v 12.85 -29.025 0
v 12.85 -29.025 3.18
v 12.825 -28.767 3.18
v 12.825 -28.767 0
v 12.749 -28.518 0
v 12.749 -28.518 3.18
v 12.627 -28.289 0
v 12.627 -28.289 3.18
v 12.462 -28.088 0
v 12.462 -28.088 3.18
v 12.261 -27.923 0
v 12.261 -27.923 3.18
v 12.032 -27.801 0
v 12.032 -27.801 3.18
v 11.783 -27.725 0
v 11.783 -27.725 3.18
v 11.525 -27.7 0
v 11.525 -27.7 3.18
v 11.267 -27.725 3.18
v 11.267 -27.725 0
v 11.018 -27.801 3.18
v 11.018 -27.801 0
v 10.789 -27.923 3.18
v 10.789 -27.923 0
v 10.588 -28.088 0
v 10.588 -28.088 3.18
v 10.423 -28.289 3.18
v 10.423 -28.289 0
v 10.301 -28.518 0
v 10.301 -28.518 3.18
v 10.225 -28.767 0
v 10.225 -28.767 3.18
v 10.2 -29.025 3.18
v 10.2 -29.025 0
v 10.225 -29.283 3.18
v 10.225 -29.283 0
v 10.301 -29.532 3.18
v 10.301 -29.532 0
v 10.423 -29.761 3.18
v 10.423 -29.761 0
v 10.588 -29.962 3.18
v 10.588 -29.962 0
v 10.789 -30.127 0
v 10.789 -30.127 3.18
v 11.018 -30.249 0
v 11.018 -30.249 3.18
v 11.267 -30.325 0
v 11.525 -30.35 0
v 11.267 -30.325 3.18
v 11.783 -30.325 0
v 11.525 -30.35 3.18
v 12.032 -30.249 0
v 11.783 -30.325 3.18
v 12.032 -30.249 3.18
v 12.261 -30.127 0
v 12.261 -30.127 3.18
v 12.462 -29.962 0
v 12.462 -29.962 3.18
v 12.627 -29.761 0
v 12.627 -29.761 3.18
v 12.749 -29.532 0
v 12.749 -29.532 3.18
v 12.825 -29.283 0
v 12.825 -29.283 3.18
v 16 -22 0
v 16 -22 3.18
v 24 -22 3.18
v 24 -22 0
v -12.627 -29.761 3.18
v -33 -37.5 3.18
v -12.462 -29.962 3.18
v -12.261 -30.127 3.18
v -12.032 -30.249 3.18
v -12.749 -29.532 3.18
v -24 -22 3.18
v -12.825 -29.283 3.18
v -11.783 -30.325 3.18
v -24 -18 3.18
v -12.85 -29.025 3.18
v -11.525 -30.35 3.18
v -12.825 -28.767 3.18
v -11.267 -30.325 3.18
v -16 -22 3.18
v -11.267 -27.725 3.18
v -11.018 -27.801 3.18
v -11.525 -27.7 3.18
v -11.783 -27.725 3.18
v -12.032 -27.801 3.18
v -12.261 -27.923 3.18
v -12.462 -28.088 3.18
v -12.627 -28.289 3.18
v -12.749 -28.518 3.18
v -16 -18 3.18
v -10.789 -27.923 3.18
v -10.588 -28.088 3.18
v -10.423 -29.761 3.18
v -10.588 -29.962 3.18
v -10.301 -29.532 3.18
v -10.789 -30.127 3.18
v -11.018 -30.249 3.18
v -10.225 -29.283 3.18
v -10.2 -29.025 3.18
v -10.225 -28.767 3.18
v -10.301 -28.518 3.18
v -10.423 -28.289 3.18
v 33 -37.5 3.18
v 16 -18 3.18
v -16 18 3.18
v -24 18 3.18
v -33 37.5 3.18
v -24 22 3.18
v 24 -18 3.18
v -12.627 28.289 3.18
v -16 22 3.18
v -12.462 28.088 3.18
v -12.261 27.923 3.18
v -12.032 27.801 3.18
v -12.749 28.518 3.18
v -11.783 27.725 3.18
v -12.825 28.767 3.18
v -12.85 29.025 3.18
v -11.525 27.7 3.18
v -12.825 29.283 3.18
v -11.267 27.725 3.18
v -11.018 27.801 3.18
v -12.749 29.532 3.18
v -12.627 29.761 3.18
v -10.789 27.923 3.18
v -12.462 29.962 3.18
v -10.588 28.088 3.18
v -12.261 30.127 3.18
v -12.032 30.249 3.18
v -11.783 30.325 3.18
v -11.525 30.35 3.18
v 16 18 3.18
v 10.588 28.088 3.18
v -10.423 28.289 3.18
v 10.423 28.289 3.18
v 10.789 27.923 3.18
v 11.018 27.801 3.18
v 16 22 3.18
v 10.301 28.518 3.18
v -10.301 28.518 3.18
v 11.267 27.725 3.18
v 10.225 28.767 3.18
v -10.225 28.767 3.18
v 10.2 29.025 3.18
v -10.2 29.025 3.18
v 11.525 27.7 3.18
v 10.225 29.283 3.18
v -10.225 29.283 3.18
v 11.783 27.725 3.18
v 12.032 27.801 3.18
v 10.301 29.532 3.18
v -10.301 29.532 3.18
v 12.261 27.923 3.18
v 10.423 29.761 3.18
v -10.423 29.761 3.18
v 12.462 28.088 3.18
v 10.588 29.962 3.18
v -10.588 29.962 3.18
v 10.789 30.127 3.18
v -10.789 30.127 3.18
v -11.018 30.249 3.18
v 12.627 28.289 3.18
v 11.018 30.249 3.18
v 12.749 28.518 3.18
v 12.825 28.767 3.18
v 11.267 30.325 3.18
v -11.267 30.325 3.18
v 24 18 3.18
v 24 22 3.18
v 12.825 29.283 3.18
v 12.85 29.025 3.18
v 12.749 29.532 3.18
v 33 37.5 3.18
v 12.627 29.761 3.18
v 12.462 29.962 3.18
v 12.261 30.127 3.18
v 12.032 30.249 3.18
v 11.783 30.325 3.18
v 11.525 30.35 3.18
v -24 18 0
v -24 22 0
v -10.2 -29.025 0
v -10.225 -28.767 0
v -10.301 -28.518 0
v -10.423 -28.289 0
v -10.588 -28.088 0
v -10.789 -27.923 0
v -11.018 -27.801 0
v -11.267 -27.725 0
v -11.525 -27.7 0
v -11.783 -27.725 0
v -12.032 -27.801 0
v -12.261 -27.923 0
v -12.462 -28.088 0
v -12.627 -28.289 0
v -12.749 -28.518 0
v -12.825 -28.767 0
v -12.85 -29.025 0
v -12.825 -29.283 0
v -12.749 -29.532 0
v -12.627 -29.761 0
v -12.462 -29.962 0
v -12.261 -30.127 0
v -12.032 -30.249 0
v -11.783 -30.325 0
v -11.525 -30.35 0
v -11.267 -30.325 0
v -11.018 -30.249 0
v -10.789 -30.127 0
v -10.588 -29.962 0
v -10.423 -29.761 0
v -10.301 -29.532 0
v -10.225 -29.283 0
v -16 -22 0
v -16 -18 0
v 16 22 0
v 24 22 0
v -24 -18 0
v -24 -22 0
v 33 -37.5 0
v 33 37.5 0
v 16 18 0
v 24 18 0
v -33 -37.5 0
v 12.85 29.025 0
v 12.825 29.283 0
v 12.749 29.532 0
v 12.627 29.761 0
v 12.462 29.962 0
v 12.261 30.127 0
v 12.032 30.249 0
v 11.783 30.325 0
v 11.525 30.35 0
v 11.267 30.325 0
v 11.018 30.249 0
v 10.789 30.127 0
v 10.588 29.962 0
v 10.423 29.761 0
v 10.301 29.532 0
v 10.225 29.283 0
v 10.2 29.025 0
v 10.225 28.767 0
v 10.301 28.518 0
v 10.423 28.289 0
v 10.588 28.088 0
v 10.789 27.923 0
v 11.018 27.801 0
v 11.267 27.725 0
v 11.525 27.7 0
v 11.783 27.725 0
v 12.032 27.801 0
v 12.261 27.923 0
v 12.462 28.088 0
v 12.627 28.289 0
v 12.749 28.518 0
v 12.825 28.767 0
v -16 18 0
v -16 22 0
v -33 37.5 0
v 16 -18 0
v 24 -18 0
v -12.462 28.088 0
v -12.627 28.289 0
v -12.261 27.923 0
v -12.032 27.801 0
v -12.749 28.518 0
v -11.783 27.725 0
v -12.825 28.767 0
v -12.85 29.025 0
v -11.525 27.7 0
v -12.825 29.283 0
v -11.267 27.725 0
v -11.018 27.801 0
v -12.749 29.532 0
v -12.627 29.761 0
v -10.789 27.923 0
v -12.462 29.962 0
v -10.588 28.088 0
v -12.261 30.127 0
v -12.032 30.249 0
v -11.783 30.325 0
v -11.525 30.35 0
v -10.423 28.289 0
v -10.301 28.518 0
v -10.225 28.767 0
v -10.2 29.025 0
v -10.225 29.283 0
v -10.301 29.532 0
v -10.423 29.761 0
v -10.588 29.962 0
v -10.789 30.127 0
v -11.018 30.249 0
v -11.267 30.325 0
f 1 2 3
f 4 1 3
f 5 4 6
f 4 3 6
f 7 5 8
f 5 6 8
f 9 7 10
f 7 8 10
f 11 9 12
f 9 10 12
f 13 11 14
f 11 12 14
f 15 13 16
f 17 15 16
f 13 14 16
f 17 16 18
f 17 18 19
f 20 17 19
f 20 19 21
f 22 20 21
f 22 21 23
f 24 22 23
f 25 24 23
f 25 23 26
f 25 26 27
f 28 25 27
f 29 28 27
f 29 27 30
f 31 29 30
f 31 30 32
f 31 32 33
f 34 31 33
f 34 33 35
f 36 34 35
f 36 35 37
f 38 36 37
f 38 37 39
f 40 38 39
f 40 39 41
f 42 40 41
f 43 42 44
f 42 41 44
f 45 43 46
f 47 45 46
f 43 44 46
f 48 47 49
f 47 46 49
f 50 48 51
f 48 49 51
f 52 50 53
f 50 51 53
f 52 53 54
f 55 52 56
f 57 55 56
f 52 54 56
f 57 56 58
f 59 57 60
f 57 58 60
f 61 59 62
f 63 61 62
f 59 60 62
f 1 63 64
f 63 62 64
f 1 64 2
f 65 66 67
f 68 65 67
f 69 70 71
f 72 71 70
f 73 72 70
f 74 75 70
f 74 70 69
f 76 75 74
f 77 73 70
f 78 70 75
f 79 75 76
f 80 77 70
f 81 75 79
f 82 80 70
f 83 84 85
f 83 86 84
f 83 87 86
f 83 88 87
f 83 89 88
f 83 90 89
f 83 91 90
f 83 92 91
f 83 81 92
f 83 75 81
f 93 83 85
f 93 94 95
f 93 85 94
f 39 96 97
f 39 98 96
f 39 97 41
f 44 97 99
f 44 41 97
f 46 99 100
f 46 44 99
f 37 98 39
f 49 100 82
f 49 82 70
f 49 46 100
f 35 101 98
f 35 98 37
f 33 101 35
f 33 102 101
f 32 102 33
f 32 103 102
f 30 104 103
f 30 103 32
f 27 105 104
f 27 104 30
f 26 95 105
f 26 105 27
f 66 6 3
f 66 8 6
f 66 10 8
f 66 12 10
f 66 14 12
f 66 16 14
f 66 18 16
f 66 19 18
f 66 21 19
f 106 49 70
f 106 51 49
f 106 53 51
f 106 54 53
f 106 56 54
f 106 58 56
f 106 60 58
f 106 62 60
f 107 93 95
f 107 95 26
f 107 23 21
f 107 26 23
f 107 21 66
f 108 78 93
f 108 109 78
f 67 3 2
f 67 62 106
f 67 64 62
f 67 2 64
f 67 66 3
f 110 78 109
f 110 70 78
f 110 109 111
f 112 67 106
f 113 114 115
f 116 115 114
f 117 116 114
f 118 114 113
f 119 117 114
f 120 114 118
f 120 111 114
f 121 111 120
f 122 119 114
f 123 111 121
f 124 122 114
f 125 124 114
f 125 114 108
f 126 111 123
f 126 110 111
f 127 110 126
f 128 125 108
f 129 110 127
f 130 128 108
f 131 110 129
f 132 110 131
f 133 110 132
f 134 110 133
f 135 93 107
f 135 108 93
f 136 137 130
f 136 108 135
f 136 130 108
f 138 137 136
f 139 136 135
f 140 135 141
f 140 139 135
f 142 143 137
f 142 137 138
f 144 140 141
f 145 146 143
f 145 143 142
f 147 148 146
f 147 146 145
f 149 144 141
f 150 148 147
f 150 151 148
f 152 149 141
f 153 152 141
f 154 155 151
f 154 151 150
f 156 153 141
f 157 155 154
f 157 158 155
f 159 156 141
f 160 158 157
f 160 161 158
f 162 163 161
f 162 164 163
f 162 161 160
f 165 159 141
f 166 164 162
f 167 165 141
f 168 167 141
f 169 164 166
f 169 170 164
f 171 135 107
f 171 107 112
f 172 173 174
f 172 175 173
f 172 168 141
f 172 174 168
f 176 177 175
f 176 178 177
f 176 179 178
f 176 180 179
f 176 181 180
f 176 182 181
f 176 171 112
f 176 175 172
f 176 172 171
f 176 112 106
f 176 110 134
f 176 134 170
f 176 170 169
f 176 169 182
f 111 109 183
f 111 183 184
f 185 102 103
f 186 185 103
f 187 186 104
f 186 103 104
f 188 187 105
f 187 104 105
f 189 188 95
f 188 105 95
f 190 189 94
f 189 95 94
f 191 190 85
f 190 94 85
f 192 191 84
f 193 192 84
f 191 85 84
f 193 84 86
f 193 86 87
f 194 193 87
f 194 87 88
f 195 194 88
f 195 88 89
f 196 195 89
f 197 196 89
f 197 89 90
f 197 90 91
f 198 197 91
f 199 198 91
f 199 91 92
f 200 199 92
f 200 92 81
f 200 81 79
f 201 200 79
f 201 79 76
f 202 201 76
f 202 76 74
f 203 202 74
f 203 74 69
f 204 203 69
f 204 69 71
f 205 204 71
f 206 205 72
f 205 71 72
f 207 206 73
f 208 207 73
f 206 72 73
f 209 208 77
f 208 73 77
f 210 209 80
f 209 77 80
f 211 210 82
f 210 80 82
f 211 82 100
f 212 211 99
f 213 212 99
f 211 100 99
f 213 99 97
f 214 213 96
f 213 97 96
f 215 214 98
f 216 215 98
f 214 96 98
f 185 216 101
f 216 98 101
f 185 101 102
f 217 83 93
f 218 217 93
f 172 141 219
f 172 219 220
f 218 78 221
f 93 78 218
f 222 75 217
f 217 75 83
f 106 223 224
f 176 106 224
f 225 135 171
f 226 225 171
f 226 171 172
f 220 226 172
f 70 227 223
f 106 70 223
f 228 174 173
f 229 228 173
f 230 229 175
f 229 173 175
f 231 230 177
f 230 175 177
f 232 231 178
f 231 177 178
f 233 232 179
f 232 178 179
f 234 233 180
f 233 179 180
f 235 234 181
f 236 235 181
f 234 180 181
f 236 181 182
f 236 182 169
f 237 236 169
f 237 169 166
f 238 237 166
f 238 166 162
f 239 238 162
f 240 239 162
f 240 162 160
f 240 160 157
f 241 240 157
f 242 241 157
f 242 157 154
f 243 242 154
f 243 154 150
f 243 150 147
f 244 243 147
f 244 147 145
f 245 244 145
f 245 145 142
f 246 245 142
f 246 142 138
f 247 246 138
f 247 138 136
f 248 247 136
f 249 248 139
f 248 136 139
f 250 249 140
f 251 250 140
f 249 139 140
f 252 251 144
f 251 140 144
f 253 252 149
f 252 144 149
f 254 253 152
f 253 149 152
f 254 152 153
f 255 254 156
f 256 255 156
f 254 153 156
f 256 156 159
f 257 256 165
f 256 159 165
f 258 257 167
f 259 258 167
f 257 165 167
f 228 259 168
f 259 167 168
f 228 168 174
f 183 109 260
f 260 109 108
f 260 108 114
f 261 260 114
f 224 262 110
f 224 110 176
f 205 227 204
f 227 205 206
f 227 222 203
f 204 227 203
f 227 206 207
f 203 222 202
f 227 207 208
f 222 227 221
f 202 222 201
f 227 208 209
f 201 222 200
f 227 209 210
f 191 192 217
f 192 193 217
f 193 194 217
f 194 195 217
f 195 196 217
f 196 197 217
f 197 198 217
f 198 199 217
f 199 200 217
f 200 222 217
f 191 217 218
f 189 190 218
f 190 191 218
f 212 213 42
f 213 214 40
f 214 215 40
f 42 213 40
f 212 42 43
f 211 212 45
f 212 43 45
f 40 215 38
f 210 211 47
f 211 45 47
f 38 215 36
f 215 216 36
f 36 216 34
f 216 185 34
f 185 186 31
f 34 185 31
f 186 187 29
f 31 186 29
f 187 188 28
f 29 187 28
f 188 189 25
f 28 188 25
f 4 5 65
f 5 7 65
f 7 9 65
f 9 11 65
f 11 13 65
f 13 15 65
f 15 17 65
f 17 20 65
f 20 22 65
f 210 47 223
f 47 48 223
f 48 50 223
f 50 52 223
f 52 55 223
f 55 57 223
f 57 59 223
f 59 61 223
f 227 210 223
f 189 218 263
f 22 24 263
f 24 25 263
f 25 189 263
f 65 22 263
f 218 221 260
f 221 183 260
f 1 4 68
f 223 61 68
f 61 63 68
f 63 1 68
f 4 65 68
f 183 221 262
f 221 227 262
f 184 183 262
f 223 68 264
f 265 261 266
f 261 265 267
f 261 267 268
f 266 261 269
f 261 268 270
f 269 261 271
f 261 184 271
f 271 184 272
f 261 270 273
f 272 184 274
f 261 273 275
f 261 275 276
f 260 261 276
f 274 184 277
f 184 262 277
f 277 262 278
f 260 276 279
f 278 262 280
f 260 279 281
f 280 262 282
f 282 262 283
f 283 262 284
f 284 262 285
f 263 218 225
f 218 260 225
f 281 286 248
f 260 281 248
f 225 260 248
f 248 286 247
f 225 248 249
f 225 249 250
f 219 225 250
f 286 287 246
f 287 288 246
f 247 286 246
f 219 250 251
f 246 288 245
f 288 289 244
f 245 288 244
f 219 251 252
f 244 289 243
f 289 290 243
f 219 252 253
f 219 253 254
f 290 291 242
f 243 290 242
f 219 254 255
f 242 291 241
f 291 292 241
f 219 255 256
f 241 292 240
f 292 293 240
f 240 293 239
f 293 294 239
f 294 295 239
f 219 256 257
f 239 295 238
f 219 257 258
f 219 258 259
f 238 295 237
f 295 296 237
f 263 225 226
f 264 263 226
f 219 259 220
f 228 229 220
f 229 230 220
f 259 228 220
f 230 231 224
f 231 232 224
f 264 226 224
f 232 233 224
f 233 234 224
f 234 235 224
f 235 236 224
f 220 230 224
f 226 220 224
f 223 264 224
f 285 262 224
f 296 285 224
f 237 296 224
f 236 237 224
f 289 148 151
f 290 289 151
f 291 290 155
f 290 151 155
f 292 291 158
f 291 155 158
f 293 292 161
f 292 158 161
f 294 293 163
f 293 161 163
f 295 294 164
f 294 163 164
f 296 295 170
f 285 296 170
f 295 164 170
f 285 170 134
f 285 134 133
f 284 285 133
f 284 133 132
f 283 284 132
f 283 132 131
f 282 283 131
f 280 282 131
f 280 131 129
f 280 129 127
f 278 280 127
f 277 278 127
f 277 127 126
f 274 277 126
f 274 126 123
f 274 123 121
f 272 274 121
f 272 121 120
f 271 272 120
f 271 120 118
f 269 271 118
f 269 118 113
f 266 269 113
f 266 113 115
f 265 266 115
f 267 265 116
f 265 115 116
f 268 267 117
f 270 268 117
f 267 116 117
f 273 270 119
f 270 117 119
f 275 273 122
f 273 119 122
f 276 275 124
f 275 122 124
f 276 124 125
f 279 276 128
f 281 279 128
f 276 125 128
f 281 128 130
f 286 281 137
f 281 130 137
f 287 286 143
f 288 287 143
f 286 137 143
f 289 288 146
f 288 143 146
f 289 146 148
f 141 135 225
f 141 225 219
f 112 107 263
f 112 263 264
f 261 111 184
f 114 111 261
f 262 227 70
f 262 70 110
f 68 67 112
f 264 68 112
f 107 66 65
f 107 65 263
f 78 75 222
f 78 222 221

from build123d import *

# Parameters (mm, degrees)
SKETCH1_W           = 66
SKETCH1_H           = 75
BOSS_EXTRUDE1_DEPTH = 3.18
SKETCH2_R           = 1.325
SKETCH2_W           = 8
SKETCH2_H           = 4
CUT_EXTRUDE1_DEPTH  = 51.053595275


with BuildPart() as part:
    # Sketch1 → Boss-Extrude1 (new body)
    with BuildSketch(Plane.XY):
        Rectangle(SKETCH1_W, SKETCH1_H)
    extrude(amount=BOSS_EXTRUDE1_DEPTH)

    # Sketch2 → Cut-Extrude1 (cut, through all)
    with BuildSketch(Plane.XY.offset(3.18)):
        with Locations((-11.525, 29.025)):
            Circle(SKETCH2_R)
        with Locations((-11.525, -29.025)):
            Circle(SKETCH2_R)
        with Locations((11.525, -29.025)):
            Circle(SKETCH2_R)
        with Locations((11.525, 29.025)):
            Circle(SKETCH2_R)
        with Locations((-20, 20)):
            Rectangle(SKETCH2_W, SKETCH2_H)
        with Locations((-20, -20)):
            Rectangle(SKETCH2_W, SKETCH2_H)
        with Locations((20, -20)):
            Rectangle(SKETCH2_W, SKETCH2_H)
        with Locations((20, 20)):
            Rectangle(SKETCH2_W, SKETCH2_H)
    extrude(amount=-CUT_EXTRUDE1_DEPTH, mode=Mode.SUBTRACT)


solid = part.part
